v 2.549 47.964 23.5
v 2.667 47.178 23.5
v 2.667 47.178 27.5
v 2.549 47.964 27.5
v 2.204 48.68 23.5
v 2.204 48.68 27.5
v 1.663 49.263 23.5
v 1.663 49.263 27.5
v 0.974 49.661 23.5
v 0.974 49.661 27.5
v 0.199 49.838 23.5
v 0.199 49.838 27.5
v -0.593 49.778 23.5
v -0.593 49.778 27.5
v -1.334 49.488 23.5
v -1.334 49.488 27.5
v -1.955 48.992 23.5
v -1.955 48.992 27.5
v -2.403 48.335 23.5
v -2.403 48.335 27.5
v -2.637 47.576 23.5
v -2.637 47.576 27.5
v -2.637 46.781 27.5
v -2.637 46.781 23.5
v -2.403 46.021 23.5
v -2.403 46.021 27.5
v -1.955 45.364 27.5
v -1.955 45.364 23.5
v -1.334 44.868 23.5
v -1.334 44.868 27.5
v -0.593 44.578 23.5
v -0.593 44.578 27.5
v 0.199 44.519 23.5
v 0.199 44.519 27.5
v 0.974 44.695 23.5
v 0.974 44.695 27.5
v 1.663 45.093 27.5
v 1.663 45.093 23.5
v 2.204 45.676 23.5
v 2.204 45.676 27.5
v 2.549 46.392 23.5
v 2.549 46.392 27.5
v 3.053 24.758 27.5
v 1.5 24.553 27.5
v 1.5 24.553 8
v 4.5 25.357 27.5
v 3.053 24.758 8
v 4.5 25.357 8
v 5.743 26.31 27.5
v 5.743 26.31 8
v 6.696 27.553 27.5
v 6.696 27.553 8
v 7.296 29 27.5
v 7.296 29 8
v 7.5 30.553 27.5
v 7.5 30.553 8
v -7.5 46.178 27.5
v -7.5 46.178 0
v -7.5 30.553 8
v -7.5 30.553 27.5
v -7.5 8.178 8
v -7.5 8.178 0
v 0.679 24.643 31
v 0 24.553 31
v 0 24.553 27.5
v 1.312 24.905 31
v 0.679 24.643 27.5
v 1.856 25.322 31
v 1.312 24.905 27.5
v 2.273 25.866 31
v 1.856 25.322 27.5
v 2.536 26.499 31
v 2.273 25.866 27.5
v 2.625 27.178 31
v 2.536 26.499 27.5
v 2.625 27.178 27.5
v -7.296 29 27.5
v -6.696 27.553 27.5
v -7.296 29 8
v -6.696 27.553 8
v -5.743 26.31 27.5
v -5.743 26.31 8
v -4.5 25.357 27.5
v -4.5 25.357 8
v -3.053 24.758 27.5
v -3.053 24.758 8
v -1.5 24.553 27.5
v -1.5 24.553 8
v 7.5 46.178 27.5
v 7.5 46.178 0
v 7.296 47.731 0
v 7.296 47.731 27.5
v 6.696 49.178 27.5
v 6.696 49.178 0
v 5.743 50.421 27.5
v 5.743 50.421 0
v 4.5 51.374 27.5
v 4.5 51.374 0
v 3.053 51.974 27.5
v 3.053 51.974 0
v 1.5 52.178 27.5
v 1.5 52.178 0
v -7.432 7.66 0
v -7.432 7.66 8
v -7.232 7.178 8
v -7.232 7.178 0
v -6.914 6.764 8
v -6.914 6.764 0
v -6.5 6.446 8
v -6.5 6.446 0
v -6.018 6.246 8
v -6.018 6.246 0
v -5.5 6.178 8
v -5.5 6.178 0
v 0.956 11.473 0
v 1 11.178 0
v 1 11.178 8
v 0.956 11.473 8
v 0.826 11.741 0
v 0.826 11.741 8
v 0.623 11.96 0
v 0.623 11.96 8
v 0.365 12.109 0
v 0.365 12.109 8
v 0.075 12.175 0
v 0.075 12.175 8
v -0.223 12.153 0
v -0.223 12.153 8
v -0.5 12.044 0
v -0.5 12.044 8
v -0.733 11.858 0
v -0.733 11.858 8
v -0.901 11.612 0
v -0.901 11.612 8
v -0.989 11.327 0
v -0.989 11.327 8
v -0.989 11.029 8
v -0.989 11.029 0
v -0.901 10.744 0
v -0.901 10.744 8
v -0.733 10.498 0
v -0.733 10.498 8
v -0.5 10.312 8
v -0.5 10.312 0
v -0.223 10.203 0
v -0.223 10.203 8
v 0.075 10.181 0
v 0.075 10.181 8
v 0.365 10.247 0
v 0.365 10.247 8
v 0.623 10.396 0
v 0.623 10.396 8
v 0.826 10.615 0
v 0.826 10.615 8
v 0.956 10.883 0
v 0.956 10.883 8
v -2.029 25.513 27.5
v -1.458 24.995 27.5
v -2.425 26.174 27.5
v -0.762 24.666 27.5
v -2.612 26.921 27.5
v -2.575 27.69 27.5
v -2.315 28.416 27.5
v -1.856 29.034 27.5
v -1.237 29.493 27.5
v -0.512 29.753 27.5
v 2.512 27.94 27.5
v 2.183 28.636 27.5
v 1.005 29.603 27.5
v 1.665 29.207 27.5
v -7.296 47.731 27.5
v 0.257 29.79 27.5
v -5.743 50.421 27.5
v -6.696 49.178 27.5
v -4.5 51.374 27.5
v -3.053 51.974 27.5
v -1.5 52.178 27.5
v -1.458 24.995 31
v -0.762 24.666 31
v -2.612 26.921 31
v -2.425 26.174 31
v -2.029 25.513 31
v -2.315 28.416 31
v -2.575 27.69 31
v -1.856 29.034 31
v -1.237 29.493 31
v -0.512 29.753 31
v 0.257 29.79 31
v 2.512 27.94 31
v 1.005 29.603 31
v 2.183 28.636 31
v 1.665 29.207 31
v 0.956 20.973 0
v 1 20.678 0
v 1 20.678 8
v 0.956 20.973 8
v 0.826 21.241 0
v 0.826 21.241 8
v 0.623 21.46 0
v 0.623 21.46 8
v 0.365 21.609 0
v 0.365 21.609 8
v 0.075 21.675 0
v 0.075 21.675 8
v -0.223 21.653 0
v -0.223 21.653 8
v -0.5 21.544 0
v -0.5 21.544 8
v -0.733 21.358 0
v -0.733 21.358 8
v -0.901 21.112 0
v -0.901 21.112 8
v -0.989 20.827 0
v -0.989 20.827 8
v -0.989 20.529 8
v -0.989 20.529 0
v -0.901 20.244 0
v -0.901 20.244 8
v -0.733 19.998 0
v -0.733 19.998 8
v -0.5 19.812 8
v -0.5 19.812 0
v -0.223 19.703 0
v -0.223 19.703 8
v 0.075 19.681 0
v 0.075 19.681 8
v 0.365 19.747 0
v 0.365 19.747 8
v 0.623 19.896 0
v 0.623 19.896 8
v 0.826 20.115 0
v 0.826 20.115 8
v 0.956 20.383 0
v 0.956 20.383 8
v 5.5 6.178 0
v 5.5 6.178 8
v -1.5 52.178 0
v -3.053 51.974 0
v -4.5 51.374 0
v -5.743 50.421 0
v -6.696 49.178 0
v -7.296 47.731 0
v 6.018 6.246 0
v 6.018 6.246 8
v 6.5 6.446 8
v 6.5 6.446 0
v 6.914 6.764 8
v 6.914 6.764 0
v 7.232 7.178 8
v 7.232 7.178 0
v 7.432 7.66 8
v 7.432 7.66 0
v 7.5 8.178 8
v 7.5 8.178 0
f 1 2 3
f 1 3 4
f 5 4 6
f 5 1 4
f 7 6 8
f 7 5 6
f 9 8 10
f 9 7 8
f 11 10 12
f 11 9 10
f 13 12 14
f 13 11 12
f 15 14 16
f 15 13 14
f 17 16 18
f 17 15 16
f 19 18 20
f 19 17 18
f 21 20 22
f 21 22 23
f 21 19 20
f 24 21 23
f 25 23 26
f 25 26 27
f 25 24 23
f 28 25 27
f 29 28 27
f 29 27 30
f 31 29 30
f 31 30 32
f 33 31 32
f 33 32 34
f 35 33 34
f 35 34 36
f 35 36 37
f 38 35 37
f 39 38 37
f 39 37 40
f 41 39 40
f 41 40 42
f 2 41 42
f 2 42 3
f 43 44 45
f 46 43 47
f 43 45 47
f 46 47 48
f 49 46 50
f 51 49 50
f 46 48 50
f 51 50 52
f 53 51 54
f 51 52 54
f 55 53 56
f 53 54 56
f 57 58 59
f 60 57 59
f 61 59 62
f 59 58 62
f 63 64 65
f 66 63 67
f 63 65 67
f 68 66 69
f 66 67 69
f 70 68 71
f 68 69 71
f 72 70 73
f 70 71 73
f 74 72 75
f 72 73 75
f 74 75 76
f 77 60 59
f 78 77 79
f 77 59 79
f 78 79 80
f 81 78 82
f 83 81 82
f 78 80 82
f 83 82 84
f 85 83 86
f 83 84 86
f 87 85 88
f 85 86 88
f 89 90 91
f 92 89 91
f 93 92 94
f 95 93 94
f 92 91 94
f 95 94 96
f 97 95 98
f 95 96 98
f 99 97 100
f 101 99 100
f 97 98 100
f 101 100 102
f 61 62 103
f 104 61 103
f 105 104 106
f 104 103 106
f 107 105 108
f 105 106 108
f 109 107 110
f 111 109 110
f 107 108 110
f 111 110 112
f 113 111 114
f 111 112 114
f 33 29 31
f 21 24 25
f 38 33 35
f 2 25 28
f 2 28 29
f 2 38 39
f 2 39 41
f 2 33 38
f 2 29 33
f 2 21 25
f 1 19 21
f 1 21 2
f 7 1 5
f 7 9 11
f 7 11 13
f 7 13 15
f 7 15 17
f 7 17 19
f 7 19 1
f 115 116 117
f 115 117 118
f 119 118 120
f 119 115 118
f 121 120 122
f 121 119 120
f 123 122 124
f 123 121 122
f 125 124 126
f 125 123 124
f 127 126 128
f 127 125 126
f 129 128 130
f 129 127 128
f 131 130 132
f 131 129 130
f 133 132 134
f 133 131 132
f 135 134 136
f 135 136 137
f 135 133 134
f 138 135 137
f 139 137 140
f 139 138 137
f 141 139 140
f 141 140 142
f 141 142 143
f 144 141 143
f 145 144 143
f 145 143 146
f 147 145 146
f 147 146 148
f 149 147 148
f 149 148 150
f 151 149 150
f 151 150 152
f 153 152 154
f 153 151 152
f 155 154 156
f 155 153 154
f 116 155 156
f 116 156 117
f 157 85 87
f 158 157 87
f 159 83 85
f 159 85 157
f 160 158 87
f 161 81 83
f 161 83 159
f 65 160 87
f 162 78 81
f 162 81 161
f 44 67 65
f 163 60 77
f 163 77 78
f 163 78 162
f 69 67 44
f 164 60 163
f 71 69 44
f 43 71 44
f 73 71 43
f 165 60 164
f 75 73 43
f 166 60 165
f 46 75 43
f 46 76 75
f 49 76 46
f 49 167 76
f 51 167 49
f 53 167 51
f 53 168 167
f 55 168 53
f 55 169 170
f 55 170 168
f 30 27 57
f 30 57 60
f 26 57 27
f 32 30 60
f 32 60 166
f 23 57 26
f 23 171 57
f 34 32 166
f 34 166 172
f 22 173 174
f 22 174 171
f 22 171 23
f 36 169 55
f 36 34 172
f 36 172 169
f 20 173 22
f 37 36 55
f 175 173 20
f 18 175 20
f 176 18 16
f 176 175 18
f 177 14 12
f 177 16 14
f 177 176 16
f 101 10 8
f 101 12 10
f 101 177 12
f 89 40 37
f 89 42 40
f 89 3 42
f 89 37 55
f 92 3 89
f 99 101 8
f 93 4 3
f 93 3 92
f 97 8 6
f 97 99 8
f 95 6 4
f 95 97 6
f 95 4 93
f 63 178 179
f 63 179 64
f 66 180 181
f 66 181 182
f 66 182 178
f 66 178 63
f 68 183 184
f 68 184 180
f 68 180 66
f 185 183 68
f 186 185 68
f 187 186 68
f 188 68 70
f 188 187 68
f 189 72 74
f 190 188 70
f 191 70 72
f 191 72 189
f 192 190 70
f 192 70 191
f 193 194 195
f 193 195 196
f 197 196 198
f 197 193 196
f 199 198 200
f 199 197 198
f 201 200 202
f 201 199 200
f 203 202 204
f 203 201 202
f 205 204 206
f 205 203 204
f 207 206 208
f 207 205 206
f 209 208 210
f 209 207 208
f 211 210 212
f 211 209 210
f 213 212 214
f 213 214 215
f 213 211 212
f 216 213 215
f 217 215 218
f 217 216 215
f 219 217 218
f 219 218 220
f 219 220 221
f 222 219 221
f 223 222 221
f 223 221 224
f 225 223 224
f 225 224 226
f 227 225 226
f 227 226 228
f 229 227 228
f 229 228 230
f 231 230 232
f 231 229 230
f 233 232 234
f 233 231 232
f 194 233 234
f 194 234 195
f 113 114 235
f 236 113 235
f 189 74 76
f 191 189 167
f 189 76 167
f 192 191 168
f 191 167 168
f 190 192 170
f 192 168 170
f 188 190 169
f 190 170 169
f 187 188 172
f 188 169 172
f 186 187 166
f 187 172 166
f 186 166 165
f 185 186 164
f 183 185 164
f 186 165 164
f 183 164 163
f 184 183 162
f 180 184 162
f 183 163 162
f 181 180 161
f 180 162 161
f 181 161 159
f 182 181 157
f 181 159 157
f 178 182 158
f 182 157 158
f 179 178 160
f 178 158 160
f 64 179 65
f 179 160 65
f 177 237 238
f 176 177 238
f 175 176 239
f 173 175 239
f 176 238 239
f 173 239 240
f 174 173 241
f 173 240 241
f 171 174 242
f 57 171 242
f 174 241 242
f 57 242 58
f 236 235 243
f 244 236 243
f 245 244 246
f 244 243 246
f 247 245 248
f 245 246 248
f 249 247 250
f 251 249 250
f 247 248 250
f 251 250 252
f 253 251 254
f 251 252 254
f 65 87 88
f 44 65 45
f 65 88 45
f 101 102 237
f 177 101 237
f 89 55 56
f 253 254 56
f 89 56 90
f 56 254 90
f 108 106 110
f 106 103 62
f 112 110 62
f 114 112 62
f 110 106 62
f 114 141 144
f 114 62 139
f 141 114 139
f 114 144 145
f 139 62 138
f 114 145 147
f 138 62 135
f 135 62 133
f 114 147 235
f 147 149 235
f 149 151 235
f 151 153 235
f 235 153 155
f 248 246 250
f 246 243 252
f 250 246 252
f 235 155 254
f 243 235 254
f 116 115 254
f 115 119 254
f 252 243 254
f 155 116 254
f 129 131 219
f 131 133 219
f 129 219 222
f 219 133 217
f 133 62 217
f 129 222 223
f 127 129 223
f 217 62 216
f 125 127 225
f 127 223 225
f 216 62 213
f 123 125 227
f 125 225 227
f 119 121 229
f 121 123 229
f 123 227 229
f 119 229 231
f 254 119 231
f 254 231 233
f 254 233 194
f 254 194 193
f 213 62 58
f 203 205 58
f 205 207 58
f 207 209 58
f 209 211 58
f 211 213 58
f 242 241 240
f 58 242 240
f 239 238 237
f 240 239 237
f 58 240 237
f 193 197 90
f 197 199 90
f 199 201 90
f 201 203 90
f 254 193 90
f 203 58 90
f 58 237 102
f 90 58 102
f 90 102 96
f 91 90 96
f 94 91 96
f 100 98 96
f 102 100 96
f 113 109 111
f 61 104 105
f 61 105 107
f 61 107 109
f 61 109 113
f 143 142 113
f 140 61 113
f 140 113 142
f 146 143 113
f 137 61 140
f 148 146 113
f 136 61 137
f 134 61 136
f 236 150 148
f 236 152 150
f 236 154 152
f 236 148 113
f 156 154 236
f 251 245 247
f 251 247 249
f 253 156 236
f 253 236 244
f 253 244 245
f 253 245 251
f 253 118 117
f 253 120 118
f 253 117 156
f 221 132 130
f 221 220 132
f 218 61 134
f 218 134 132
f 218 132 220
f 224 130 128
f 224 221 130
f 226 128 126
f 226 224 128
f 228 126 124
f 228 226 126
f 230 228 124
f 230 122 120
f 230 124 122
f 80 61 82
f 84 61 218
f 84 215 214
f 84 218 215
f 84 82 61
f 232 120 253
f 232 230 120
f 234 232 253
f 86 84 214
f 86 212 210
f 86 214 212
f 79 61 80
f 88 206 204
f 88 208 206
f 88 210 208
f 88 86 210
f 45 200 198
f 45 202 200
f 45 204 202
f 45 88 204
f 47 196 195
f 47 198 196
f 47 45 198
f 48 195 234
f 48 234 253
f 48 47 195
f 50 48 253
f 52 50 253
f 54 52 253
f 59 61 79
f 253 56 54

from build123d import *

# Parameters (mm, degrees)
F0_R     = 1
F2_DEPTH = 8
F0_R_2   = 2.667
F3_DEPTH = 27.5
F4_DEPTH = 31
F5_DEPTH = 23.5


with BuildPart() as f2:
    # F0 (on Top) → F2 (new body)
    with BuildSketch(Plane.XY):
        with BuildLine():
            Line((1.5, 24.5531070977), (0, 24.5531070977))
            Line((0, 24.5531070977), (-1.5, 24.5531070977))
            ThreePointArc((-1.5, 24.5531070977), (-5.7426406871, 26.3104664106), (-7.5, 30.5531070977))
            Line((-7.5, 30.5531070977), (-7.5, 8.1781070977))
            ThreePointArc((-7.5, 8.1781070977), (-6.9142135624, 6.7638935354), (-5.5, 6.1781070977))
            Line((-5.5, 6.1781070977), (5.5, 6.1781070977))
            ThreePointArc((5.5, 6.1781070977), (6.9142135624, 6.7638935354), (7.5, 8.1781070977))
            Line((7.5, 8.1781070977), (7.5, 30.5531070977))
            ThreePointArc((7.5, 30.5531070977), (5.7426406871, 26.3104664106), (1.5, 24.5531070977))
        make_face()
        with Locations((0, 11.1781070977)):
            Circle(F0_R, mode=Mode.SUBTRACT)
        with Locations((0, 20.6781070977)):
            Circle(F0_R, mode=Mode.SUBTRACT)
    extrude(amount=F2_DEPTH)

    # F0 (on Top) → F3 (join)
    with BuildSketch(Plane.XY):
        with BuildLine():
            Line((-1.5, 24.5531070977), (0, 24.5531070977))
            Line((0, 24.5531070977), (1.5, 24.5531070977))
            ThreePointArc((1.5, 24.5531070977), (5.7426406871, 26.3104664106), (7.5, 30.5531070977))
            Line((7.5, 30.5531070977), (7.5, 46.1781070977))
            ThreePointArc((7.5, 46.1781070977), (5.7426406871, 50.4207477849), (1.5, 52.1781070977))
            Line((1.5, 52.1781070977), (-1.5, 52.1781070977))
            ThreePointArc((-1.5, 52.1781070977), (-5.7426406871, 50.4207477849), (-7.5, 46.1781070977))
            Line((-7.5, 46.1781070977), (-7.5, 30.5531070977))
            ThreePointArc((-7.5, 30.5531070977), (-5.7426406871, 26.3104664106), (-1.5, 24.5531070977))
        make_face()
        with BuildLine():
            ThreePointArc((0, 24.5531070977), (-1.8561553006, 29.0342623984), (2.625, 27.1781070977))
            ThreePointArc((2.625, 27.1781070977), (1.8561553006, 25.3219517971), (0, 24.5531070977))
        make_face(mode=Mode.SUBTRACT)
        with Locations((0, 47.1781070977)):
            Circle(F0_R_2, mode=Mode.SUBTRACT)
        with BuildLine():
            ThreePointArc((0, 24.5531070977), (1.8561553006, 25.3219517971), (2.625, 27.1781070977))
            ThreePointArc((2.625, 27.1781070977), (-1.8561553006, 29.0342623984), (0, 24.5531070977))
        make_face()
    extrude(amount=F3_DEPTH)

    # F0 (on Top) → F4 (join)
    with BuildSketch(Plane.XY):
        with BuildLine():
            ThreePointArc((0, 24.5531070977), (1.8561553006, 25.3219517971), (2.625, 27.1781070977))
            ThreePointArc((2.625, 27.1781070977), (-1.8561553006, 29.0342623984), (0, 24.5531070977))
        make_face()
    extrude(amount=F4_DEPTH)

    # F0 (on Top) → F5 (join)
    with BuildSketch(Plane.XY):
        with Locations((0, 47.1781070977)):
            Circle(F0_R_2)
    extrude(amount=F5_DEPTH)


solid = f2.part
